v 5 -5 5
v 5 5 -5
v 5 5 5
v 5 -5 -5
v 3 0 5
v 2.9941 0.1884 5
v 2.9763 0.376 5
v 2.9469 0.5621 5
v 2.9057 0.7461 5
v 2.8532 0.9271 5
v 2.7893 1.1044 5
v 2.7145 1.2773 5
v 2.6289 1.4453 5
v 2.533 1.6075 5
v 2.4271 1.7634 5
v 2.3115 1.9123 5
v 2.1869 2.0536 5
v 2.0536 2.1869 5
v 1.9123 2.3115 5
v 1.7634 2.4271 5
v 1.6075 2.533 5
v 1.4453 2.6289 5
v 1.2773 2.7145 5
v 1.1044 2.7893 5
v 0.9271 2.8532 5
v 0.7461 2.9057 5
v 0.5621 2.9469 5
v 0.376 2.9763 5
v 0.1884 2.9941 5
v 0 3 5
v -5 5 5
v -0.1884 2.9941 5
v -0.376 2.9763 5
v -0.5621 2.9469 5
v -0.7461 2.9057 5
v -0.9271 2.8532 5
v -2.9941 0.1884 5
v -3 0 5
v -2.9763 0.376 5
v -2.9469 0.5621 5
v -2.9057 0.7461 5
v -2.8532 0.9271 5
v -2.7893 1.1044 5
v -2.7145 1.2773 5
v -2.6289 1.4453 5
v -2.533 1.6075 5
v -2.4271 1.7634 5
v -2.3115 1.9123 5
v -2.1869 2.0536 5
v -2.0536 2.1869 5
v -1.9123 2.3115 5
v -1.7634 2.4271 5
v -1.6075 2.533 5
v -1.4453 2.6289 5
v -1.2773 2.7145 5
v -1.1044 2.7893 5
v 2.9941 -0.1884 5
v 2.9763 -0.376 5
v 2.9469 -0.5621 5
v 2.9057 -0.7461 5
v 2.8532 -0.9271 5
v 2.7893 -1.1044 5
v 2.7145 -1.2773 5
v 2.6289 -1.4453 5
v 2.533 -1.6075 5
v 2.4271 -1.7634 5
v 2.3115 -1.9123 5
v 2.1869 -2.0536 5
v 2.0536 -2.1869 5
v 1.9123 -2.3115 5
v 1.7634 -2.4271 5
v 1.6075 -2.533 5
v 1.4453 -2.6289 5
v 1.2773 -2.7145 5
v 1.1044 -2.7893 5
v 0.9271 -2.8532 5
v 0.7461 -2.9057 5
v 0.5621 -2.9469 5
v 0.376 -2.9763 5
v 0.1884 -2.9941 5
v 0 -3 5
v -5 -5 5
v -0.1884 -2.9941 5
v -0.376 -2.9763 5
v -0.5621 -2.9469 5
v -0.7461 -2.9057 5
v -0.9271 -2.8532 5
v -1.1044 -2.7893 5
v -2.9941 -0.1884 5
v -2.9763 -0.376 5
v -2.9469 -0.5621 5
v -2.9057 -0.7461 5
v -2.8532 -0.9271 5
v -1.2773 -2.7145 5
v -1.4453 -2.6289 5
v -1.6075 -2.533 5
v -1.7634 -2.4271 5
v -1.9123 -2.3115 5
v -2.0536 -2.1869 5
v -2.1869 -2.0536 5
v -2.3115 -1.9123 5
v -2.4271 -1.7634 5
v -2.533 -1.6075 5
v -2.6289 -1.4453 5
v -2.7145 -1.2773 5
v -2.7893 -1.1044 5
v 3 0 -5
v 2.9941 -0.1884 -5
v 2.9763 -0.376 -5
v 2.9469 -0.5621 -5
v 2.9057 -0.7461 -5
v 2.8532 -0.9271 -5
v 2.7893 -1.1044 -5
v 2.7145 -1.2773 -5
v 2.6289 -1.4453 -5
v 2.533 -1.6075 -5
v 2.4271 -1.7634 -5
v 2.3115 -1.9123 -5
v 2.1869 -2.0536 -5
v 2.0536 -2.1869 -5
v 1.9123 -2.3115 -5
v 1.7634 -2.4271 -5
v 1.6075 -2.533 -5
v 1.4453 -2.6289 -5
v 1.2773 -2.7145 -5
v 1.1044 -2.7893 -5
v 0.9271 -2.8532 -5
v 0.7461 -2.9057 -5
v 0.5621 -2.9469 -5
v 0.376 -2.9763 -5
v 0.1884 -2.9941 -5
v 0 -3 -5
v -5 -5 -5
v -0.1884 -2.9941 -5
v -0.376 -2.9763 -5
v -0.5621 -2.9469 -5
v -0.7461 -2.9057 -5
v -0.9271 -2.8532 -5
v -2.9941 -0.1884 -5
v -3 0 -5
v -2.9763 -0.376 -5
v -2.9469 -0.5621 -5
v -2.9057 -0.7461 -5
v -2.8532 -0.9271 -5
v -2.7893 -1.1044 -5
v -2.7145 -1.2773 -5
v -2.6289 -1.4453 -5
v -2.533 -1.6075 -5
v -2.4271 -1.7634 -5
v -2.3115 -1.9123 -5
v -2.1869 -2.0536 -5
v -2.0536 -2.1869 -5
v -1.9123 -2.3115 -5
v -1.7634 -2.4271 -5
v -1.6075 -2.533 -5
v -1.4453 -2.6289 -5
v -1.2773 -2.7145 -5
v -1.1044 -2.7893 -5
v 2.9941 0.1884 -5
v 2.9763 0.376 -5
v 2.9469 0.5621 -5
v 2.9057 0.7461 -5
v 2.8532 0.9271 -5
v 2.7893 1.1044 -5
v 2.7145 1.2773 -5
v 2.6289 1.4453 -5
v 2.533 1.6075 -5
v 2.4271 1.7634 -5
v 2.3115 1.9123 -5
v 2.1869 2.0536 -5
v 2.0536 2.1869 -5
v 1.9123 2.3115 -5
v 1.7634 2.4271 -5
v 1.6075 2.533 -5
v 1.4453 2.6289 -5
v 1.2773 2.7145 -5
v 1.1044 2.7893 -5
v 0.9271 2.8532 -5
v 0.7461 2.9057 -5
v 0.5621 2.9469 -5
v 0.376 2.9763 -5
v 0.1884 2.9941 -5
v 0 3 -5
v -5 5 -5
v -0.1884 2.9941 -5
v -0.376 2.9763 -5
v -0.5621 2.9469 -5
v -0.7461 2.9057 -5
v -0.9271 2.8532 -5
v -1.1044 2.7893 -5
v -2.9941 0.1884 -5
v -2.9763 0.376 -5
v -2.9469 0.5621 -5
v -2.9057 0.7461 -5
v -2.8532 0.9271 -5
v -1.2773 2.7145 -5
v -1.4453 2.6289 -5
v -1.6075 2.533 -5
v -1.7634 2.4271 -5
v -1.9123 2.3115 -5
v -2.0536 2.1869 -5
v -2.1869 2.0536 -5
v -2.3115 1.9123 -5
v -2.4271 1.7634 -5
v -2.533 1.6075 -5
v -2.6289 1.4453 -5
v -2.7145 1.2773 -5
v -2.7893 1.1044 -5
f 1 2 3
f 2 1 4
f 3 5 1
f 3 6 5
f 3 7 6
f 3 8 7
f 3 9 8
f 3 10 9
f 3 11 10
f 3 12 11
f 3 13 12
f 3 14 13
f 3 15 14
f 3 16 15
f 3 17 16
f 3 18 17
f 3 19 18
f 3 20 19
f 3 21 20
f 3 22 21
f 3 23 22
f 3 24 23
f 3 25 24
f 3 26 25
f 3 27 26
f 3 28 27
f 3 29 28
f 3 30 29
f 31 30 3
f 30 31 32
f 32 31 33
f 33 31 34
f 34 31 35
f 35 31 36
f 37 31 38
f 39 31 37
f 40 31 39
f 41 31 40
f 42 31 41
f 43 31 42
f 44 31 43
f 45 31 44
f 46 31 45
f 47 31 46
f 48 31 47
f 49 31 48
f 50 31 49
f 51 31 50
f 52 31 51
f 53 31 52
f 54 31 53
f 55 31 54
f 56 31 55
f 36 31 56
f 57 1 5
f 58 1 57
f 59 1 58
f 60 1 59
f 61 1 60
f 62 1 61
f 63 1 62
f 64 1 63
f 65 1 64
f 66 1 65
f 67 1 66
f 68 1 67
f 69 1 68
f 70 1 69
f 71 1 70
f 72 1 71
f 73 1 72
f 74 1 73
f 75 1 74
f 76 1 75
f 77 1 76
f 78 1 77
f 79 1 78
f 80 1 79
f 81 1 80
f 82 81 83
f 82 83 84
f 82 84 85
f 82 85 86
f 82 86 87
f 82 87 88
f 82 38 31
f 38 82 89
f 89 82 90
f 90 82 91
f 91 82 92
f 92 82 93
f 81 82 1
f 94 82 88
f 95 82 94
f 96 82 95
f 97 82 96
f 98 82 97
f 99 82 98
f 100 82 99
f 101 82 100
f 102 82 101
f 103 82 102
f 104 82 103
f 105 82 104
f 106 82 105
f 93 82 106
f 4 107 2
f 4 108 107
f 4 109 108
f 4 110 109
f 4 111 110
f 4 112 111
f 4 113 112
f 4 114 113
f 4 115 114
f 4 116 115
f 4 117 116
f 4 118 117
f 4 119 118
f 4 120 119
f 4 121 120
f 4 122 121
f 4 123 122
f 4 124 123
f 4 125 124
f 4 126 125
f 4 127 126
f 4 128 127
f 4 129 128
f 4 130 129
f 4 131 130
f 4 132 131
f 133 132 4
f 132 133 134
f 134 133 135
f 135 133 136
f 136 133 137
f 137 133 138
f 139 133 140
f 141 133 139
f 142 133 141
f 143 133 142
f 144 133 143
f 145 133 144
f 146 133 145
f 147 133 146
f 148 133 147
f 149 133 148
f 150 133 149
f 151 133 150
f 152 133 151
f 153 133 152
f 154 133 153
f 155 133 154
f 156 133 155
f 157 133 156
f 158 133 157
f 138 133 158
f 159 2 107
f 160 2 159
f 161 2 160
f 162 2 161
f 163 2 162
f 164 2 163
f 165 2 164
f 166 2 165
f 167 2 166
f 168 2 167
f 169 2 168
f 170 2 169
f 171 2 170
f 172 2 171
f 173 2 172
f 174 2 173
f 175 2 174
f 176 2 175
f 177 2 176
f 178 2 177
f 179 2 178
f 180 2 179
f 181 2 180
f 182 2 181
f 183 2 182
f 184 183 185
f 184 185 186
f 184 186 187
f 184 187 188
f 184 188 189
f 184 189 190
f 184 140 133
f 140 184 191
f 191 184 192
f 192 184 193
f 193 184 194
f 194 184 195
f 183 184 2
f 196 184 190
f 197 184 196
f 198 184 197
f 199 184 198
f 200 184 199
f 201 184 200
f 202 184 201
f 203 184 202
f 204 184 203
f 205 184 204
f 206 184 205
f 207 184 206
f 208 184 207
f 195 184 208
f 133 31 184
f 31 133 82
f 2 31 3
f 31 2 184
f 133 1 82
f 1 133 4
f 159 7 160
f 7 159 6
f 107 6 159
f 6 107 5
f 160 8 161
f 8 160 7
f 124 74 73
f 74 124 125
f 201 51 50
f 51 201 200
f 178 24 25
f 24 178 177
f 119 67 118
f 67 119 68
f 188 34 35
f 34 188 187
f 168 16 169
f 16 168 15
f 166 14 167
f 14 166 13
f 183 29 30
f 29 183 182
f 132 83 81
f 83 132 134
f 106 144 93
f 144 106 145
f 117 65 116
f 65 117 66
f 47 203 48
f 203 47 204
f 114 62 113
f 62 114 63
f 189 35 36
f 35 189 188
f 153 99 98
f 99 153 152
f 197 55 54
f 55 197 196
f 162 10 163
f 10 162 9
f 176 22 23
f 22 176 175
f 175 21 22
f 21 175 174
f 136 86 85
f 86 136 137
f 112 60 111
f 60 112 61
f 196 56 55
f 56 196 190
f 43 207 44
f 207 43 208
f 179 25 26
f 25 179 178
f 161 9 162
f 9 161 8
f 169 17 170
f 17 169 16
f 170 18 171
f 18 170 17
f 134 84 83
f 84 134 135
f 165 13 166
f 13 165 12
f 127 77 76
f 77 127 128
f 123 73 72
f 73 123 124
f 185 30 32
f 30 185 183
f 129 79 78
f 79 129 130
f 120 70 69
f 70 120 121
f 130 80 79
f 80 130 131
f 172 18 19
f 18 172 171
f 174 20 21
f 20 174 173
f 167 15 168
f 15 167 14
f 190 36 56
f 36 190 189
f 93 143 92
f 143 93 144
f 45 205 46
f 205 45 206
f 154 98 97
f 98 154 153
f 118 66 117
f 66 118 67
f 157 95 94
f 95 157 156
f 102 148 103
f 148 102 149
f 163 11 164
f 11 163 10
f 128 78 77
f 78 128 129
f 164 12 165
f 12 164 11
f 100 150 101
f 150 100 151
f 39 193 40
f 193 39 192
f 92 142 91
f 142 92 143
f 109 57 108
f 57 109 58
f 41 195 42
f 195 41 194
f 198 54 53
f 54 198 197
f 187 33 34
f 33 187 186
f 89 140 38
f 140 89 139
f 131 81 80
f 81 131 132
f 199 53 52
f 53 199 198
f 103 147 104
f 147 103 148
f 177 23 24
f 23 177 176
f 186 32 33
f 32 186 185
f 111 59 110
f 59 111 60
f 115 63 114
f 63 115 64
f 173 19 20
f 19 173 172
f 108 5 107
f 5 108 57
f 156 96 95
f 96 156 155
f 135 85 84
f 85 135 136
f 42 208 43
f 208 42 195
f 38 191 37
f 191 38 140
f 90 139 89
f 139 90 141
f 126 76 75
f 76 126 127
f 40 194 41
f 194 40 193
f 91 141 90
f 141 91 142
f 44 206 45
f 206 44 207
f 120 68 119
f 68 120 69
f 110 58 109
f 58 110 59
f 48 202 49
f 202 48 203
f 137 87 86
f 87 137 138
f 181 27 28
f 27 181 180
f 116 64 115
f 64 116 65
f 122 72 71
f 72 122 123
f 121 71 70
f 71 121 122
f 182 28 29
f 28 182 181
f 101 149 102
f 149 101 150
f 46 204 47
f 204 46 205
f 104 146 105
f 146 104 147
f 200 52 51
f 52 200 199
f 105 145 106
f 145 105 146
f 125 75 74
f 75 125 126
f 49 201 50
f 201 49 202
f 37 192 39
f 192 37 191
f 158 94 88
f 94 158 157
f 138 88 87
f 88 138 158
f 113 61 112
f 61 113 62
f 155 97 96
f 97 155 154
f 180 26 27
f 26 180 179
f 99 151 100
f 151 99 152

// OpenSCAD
$fn=100;

difference() {
#cube(10, center=true);
   
  translate([0, 0, -20]) {  
    cylinder(40, 3, 3);
  };
};
